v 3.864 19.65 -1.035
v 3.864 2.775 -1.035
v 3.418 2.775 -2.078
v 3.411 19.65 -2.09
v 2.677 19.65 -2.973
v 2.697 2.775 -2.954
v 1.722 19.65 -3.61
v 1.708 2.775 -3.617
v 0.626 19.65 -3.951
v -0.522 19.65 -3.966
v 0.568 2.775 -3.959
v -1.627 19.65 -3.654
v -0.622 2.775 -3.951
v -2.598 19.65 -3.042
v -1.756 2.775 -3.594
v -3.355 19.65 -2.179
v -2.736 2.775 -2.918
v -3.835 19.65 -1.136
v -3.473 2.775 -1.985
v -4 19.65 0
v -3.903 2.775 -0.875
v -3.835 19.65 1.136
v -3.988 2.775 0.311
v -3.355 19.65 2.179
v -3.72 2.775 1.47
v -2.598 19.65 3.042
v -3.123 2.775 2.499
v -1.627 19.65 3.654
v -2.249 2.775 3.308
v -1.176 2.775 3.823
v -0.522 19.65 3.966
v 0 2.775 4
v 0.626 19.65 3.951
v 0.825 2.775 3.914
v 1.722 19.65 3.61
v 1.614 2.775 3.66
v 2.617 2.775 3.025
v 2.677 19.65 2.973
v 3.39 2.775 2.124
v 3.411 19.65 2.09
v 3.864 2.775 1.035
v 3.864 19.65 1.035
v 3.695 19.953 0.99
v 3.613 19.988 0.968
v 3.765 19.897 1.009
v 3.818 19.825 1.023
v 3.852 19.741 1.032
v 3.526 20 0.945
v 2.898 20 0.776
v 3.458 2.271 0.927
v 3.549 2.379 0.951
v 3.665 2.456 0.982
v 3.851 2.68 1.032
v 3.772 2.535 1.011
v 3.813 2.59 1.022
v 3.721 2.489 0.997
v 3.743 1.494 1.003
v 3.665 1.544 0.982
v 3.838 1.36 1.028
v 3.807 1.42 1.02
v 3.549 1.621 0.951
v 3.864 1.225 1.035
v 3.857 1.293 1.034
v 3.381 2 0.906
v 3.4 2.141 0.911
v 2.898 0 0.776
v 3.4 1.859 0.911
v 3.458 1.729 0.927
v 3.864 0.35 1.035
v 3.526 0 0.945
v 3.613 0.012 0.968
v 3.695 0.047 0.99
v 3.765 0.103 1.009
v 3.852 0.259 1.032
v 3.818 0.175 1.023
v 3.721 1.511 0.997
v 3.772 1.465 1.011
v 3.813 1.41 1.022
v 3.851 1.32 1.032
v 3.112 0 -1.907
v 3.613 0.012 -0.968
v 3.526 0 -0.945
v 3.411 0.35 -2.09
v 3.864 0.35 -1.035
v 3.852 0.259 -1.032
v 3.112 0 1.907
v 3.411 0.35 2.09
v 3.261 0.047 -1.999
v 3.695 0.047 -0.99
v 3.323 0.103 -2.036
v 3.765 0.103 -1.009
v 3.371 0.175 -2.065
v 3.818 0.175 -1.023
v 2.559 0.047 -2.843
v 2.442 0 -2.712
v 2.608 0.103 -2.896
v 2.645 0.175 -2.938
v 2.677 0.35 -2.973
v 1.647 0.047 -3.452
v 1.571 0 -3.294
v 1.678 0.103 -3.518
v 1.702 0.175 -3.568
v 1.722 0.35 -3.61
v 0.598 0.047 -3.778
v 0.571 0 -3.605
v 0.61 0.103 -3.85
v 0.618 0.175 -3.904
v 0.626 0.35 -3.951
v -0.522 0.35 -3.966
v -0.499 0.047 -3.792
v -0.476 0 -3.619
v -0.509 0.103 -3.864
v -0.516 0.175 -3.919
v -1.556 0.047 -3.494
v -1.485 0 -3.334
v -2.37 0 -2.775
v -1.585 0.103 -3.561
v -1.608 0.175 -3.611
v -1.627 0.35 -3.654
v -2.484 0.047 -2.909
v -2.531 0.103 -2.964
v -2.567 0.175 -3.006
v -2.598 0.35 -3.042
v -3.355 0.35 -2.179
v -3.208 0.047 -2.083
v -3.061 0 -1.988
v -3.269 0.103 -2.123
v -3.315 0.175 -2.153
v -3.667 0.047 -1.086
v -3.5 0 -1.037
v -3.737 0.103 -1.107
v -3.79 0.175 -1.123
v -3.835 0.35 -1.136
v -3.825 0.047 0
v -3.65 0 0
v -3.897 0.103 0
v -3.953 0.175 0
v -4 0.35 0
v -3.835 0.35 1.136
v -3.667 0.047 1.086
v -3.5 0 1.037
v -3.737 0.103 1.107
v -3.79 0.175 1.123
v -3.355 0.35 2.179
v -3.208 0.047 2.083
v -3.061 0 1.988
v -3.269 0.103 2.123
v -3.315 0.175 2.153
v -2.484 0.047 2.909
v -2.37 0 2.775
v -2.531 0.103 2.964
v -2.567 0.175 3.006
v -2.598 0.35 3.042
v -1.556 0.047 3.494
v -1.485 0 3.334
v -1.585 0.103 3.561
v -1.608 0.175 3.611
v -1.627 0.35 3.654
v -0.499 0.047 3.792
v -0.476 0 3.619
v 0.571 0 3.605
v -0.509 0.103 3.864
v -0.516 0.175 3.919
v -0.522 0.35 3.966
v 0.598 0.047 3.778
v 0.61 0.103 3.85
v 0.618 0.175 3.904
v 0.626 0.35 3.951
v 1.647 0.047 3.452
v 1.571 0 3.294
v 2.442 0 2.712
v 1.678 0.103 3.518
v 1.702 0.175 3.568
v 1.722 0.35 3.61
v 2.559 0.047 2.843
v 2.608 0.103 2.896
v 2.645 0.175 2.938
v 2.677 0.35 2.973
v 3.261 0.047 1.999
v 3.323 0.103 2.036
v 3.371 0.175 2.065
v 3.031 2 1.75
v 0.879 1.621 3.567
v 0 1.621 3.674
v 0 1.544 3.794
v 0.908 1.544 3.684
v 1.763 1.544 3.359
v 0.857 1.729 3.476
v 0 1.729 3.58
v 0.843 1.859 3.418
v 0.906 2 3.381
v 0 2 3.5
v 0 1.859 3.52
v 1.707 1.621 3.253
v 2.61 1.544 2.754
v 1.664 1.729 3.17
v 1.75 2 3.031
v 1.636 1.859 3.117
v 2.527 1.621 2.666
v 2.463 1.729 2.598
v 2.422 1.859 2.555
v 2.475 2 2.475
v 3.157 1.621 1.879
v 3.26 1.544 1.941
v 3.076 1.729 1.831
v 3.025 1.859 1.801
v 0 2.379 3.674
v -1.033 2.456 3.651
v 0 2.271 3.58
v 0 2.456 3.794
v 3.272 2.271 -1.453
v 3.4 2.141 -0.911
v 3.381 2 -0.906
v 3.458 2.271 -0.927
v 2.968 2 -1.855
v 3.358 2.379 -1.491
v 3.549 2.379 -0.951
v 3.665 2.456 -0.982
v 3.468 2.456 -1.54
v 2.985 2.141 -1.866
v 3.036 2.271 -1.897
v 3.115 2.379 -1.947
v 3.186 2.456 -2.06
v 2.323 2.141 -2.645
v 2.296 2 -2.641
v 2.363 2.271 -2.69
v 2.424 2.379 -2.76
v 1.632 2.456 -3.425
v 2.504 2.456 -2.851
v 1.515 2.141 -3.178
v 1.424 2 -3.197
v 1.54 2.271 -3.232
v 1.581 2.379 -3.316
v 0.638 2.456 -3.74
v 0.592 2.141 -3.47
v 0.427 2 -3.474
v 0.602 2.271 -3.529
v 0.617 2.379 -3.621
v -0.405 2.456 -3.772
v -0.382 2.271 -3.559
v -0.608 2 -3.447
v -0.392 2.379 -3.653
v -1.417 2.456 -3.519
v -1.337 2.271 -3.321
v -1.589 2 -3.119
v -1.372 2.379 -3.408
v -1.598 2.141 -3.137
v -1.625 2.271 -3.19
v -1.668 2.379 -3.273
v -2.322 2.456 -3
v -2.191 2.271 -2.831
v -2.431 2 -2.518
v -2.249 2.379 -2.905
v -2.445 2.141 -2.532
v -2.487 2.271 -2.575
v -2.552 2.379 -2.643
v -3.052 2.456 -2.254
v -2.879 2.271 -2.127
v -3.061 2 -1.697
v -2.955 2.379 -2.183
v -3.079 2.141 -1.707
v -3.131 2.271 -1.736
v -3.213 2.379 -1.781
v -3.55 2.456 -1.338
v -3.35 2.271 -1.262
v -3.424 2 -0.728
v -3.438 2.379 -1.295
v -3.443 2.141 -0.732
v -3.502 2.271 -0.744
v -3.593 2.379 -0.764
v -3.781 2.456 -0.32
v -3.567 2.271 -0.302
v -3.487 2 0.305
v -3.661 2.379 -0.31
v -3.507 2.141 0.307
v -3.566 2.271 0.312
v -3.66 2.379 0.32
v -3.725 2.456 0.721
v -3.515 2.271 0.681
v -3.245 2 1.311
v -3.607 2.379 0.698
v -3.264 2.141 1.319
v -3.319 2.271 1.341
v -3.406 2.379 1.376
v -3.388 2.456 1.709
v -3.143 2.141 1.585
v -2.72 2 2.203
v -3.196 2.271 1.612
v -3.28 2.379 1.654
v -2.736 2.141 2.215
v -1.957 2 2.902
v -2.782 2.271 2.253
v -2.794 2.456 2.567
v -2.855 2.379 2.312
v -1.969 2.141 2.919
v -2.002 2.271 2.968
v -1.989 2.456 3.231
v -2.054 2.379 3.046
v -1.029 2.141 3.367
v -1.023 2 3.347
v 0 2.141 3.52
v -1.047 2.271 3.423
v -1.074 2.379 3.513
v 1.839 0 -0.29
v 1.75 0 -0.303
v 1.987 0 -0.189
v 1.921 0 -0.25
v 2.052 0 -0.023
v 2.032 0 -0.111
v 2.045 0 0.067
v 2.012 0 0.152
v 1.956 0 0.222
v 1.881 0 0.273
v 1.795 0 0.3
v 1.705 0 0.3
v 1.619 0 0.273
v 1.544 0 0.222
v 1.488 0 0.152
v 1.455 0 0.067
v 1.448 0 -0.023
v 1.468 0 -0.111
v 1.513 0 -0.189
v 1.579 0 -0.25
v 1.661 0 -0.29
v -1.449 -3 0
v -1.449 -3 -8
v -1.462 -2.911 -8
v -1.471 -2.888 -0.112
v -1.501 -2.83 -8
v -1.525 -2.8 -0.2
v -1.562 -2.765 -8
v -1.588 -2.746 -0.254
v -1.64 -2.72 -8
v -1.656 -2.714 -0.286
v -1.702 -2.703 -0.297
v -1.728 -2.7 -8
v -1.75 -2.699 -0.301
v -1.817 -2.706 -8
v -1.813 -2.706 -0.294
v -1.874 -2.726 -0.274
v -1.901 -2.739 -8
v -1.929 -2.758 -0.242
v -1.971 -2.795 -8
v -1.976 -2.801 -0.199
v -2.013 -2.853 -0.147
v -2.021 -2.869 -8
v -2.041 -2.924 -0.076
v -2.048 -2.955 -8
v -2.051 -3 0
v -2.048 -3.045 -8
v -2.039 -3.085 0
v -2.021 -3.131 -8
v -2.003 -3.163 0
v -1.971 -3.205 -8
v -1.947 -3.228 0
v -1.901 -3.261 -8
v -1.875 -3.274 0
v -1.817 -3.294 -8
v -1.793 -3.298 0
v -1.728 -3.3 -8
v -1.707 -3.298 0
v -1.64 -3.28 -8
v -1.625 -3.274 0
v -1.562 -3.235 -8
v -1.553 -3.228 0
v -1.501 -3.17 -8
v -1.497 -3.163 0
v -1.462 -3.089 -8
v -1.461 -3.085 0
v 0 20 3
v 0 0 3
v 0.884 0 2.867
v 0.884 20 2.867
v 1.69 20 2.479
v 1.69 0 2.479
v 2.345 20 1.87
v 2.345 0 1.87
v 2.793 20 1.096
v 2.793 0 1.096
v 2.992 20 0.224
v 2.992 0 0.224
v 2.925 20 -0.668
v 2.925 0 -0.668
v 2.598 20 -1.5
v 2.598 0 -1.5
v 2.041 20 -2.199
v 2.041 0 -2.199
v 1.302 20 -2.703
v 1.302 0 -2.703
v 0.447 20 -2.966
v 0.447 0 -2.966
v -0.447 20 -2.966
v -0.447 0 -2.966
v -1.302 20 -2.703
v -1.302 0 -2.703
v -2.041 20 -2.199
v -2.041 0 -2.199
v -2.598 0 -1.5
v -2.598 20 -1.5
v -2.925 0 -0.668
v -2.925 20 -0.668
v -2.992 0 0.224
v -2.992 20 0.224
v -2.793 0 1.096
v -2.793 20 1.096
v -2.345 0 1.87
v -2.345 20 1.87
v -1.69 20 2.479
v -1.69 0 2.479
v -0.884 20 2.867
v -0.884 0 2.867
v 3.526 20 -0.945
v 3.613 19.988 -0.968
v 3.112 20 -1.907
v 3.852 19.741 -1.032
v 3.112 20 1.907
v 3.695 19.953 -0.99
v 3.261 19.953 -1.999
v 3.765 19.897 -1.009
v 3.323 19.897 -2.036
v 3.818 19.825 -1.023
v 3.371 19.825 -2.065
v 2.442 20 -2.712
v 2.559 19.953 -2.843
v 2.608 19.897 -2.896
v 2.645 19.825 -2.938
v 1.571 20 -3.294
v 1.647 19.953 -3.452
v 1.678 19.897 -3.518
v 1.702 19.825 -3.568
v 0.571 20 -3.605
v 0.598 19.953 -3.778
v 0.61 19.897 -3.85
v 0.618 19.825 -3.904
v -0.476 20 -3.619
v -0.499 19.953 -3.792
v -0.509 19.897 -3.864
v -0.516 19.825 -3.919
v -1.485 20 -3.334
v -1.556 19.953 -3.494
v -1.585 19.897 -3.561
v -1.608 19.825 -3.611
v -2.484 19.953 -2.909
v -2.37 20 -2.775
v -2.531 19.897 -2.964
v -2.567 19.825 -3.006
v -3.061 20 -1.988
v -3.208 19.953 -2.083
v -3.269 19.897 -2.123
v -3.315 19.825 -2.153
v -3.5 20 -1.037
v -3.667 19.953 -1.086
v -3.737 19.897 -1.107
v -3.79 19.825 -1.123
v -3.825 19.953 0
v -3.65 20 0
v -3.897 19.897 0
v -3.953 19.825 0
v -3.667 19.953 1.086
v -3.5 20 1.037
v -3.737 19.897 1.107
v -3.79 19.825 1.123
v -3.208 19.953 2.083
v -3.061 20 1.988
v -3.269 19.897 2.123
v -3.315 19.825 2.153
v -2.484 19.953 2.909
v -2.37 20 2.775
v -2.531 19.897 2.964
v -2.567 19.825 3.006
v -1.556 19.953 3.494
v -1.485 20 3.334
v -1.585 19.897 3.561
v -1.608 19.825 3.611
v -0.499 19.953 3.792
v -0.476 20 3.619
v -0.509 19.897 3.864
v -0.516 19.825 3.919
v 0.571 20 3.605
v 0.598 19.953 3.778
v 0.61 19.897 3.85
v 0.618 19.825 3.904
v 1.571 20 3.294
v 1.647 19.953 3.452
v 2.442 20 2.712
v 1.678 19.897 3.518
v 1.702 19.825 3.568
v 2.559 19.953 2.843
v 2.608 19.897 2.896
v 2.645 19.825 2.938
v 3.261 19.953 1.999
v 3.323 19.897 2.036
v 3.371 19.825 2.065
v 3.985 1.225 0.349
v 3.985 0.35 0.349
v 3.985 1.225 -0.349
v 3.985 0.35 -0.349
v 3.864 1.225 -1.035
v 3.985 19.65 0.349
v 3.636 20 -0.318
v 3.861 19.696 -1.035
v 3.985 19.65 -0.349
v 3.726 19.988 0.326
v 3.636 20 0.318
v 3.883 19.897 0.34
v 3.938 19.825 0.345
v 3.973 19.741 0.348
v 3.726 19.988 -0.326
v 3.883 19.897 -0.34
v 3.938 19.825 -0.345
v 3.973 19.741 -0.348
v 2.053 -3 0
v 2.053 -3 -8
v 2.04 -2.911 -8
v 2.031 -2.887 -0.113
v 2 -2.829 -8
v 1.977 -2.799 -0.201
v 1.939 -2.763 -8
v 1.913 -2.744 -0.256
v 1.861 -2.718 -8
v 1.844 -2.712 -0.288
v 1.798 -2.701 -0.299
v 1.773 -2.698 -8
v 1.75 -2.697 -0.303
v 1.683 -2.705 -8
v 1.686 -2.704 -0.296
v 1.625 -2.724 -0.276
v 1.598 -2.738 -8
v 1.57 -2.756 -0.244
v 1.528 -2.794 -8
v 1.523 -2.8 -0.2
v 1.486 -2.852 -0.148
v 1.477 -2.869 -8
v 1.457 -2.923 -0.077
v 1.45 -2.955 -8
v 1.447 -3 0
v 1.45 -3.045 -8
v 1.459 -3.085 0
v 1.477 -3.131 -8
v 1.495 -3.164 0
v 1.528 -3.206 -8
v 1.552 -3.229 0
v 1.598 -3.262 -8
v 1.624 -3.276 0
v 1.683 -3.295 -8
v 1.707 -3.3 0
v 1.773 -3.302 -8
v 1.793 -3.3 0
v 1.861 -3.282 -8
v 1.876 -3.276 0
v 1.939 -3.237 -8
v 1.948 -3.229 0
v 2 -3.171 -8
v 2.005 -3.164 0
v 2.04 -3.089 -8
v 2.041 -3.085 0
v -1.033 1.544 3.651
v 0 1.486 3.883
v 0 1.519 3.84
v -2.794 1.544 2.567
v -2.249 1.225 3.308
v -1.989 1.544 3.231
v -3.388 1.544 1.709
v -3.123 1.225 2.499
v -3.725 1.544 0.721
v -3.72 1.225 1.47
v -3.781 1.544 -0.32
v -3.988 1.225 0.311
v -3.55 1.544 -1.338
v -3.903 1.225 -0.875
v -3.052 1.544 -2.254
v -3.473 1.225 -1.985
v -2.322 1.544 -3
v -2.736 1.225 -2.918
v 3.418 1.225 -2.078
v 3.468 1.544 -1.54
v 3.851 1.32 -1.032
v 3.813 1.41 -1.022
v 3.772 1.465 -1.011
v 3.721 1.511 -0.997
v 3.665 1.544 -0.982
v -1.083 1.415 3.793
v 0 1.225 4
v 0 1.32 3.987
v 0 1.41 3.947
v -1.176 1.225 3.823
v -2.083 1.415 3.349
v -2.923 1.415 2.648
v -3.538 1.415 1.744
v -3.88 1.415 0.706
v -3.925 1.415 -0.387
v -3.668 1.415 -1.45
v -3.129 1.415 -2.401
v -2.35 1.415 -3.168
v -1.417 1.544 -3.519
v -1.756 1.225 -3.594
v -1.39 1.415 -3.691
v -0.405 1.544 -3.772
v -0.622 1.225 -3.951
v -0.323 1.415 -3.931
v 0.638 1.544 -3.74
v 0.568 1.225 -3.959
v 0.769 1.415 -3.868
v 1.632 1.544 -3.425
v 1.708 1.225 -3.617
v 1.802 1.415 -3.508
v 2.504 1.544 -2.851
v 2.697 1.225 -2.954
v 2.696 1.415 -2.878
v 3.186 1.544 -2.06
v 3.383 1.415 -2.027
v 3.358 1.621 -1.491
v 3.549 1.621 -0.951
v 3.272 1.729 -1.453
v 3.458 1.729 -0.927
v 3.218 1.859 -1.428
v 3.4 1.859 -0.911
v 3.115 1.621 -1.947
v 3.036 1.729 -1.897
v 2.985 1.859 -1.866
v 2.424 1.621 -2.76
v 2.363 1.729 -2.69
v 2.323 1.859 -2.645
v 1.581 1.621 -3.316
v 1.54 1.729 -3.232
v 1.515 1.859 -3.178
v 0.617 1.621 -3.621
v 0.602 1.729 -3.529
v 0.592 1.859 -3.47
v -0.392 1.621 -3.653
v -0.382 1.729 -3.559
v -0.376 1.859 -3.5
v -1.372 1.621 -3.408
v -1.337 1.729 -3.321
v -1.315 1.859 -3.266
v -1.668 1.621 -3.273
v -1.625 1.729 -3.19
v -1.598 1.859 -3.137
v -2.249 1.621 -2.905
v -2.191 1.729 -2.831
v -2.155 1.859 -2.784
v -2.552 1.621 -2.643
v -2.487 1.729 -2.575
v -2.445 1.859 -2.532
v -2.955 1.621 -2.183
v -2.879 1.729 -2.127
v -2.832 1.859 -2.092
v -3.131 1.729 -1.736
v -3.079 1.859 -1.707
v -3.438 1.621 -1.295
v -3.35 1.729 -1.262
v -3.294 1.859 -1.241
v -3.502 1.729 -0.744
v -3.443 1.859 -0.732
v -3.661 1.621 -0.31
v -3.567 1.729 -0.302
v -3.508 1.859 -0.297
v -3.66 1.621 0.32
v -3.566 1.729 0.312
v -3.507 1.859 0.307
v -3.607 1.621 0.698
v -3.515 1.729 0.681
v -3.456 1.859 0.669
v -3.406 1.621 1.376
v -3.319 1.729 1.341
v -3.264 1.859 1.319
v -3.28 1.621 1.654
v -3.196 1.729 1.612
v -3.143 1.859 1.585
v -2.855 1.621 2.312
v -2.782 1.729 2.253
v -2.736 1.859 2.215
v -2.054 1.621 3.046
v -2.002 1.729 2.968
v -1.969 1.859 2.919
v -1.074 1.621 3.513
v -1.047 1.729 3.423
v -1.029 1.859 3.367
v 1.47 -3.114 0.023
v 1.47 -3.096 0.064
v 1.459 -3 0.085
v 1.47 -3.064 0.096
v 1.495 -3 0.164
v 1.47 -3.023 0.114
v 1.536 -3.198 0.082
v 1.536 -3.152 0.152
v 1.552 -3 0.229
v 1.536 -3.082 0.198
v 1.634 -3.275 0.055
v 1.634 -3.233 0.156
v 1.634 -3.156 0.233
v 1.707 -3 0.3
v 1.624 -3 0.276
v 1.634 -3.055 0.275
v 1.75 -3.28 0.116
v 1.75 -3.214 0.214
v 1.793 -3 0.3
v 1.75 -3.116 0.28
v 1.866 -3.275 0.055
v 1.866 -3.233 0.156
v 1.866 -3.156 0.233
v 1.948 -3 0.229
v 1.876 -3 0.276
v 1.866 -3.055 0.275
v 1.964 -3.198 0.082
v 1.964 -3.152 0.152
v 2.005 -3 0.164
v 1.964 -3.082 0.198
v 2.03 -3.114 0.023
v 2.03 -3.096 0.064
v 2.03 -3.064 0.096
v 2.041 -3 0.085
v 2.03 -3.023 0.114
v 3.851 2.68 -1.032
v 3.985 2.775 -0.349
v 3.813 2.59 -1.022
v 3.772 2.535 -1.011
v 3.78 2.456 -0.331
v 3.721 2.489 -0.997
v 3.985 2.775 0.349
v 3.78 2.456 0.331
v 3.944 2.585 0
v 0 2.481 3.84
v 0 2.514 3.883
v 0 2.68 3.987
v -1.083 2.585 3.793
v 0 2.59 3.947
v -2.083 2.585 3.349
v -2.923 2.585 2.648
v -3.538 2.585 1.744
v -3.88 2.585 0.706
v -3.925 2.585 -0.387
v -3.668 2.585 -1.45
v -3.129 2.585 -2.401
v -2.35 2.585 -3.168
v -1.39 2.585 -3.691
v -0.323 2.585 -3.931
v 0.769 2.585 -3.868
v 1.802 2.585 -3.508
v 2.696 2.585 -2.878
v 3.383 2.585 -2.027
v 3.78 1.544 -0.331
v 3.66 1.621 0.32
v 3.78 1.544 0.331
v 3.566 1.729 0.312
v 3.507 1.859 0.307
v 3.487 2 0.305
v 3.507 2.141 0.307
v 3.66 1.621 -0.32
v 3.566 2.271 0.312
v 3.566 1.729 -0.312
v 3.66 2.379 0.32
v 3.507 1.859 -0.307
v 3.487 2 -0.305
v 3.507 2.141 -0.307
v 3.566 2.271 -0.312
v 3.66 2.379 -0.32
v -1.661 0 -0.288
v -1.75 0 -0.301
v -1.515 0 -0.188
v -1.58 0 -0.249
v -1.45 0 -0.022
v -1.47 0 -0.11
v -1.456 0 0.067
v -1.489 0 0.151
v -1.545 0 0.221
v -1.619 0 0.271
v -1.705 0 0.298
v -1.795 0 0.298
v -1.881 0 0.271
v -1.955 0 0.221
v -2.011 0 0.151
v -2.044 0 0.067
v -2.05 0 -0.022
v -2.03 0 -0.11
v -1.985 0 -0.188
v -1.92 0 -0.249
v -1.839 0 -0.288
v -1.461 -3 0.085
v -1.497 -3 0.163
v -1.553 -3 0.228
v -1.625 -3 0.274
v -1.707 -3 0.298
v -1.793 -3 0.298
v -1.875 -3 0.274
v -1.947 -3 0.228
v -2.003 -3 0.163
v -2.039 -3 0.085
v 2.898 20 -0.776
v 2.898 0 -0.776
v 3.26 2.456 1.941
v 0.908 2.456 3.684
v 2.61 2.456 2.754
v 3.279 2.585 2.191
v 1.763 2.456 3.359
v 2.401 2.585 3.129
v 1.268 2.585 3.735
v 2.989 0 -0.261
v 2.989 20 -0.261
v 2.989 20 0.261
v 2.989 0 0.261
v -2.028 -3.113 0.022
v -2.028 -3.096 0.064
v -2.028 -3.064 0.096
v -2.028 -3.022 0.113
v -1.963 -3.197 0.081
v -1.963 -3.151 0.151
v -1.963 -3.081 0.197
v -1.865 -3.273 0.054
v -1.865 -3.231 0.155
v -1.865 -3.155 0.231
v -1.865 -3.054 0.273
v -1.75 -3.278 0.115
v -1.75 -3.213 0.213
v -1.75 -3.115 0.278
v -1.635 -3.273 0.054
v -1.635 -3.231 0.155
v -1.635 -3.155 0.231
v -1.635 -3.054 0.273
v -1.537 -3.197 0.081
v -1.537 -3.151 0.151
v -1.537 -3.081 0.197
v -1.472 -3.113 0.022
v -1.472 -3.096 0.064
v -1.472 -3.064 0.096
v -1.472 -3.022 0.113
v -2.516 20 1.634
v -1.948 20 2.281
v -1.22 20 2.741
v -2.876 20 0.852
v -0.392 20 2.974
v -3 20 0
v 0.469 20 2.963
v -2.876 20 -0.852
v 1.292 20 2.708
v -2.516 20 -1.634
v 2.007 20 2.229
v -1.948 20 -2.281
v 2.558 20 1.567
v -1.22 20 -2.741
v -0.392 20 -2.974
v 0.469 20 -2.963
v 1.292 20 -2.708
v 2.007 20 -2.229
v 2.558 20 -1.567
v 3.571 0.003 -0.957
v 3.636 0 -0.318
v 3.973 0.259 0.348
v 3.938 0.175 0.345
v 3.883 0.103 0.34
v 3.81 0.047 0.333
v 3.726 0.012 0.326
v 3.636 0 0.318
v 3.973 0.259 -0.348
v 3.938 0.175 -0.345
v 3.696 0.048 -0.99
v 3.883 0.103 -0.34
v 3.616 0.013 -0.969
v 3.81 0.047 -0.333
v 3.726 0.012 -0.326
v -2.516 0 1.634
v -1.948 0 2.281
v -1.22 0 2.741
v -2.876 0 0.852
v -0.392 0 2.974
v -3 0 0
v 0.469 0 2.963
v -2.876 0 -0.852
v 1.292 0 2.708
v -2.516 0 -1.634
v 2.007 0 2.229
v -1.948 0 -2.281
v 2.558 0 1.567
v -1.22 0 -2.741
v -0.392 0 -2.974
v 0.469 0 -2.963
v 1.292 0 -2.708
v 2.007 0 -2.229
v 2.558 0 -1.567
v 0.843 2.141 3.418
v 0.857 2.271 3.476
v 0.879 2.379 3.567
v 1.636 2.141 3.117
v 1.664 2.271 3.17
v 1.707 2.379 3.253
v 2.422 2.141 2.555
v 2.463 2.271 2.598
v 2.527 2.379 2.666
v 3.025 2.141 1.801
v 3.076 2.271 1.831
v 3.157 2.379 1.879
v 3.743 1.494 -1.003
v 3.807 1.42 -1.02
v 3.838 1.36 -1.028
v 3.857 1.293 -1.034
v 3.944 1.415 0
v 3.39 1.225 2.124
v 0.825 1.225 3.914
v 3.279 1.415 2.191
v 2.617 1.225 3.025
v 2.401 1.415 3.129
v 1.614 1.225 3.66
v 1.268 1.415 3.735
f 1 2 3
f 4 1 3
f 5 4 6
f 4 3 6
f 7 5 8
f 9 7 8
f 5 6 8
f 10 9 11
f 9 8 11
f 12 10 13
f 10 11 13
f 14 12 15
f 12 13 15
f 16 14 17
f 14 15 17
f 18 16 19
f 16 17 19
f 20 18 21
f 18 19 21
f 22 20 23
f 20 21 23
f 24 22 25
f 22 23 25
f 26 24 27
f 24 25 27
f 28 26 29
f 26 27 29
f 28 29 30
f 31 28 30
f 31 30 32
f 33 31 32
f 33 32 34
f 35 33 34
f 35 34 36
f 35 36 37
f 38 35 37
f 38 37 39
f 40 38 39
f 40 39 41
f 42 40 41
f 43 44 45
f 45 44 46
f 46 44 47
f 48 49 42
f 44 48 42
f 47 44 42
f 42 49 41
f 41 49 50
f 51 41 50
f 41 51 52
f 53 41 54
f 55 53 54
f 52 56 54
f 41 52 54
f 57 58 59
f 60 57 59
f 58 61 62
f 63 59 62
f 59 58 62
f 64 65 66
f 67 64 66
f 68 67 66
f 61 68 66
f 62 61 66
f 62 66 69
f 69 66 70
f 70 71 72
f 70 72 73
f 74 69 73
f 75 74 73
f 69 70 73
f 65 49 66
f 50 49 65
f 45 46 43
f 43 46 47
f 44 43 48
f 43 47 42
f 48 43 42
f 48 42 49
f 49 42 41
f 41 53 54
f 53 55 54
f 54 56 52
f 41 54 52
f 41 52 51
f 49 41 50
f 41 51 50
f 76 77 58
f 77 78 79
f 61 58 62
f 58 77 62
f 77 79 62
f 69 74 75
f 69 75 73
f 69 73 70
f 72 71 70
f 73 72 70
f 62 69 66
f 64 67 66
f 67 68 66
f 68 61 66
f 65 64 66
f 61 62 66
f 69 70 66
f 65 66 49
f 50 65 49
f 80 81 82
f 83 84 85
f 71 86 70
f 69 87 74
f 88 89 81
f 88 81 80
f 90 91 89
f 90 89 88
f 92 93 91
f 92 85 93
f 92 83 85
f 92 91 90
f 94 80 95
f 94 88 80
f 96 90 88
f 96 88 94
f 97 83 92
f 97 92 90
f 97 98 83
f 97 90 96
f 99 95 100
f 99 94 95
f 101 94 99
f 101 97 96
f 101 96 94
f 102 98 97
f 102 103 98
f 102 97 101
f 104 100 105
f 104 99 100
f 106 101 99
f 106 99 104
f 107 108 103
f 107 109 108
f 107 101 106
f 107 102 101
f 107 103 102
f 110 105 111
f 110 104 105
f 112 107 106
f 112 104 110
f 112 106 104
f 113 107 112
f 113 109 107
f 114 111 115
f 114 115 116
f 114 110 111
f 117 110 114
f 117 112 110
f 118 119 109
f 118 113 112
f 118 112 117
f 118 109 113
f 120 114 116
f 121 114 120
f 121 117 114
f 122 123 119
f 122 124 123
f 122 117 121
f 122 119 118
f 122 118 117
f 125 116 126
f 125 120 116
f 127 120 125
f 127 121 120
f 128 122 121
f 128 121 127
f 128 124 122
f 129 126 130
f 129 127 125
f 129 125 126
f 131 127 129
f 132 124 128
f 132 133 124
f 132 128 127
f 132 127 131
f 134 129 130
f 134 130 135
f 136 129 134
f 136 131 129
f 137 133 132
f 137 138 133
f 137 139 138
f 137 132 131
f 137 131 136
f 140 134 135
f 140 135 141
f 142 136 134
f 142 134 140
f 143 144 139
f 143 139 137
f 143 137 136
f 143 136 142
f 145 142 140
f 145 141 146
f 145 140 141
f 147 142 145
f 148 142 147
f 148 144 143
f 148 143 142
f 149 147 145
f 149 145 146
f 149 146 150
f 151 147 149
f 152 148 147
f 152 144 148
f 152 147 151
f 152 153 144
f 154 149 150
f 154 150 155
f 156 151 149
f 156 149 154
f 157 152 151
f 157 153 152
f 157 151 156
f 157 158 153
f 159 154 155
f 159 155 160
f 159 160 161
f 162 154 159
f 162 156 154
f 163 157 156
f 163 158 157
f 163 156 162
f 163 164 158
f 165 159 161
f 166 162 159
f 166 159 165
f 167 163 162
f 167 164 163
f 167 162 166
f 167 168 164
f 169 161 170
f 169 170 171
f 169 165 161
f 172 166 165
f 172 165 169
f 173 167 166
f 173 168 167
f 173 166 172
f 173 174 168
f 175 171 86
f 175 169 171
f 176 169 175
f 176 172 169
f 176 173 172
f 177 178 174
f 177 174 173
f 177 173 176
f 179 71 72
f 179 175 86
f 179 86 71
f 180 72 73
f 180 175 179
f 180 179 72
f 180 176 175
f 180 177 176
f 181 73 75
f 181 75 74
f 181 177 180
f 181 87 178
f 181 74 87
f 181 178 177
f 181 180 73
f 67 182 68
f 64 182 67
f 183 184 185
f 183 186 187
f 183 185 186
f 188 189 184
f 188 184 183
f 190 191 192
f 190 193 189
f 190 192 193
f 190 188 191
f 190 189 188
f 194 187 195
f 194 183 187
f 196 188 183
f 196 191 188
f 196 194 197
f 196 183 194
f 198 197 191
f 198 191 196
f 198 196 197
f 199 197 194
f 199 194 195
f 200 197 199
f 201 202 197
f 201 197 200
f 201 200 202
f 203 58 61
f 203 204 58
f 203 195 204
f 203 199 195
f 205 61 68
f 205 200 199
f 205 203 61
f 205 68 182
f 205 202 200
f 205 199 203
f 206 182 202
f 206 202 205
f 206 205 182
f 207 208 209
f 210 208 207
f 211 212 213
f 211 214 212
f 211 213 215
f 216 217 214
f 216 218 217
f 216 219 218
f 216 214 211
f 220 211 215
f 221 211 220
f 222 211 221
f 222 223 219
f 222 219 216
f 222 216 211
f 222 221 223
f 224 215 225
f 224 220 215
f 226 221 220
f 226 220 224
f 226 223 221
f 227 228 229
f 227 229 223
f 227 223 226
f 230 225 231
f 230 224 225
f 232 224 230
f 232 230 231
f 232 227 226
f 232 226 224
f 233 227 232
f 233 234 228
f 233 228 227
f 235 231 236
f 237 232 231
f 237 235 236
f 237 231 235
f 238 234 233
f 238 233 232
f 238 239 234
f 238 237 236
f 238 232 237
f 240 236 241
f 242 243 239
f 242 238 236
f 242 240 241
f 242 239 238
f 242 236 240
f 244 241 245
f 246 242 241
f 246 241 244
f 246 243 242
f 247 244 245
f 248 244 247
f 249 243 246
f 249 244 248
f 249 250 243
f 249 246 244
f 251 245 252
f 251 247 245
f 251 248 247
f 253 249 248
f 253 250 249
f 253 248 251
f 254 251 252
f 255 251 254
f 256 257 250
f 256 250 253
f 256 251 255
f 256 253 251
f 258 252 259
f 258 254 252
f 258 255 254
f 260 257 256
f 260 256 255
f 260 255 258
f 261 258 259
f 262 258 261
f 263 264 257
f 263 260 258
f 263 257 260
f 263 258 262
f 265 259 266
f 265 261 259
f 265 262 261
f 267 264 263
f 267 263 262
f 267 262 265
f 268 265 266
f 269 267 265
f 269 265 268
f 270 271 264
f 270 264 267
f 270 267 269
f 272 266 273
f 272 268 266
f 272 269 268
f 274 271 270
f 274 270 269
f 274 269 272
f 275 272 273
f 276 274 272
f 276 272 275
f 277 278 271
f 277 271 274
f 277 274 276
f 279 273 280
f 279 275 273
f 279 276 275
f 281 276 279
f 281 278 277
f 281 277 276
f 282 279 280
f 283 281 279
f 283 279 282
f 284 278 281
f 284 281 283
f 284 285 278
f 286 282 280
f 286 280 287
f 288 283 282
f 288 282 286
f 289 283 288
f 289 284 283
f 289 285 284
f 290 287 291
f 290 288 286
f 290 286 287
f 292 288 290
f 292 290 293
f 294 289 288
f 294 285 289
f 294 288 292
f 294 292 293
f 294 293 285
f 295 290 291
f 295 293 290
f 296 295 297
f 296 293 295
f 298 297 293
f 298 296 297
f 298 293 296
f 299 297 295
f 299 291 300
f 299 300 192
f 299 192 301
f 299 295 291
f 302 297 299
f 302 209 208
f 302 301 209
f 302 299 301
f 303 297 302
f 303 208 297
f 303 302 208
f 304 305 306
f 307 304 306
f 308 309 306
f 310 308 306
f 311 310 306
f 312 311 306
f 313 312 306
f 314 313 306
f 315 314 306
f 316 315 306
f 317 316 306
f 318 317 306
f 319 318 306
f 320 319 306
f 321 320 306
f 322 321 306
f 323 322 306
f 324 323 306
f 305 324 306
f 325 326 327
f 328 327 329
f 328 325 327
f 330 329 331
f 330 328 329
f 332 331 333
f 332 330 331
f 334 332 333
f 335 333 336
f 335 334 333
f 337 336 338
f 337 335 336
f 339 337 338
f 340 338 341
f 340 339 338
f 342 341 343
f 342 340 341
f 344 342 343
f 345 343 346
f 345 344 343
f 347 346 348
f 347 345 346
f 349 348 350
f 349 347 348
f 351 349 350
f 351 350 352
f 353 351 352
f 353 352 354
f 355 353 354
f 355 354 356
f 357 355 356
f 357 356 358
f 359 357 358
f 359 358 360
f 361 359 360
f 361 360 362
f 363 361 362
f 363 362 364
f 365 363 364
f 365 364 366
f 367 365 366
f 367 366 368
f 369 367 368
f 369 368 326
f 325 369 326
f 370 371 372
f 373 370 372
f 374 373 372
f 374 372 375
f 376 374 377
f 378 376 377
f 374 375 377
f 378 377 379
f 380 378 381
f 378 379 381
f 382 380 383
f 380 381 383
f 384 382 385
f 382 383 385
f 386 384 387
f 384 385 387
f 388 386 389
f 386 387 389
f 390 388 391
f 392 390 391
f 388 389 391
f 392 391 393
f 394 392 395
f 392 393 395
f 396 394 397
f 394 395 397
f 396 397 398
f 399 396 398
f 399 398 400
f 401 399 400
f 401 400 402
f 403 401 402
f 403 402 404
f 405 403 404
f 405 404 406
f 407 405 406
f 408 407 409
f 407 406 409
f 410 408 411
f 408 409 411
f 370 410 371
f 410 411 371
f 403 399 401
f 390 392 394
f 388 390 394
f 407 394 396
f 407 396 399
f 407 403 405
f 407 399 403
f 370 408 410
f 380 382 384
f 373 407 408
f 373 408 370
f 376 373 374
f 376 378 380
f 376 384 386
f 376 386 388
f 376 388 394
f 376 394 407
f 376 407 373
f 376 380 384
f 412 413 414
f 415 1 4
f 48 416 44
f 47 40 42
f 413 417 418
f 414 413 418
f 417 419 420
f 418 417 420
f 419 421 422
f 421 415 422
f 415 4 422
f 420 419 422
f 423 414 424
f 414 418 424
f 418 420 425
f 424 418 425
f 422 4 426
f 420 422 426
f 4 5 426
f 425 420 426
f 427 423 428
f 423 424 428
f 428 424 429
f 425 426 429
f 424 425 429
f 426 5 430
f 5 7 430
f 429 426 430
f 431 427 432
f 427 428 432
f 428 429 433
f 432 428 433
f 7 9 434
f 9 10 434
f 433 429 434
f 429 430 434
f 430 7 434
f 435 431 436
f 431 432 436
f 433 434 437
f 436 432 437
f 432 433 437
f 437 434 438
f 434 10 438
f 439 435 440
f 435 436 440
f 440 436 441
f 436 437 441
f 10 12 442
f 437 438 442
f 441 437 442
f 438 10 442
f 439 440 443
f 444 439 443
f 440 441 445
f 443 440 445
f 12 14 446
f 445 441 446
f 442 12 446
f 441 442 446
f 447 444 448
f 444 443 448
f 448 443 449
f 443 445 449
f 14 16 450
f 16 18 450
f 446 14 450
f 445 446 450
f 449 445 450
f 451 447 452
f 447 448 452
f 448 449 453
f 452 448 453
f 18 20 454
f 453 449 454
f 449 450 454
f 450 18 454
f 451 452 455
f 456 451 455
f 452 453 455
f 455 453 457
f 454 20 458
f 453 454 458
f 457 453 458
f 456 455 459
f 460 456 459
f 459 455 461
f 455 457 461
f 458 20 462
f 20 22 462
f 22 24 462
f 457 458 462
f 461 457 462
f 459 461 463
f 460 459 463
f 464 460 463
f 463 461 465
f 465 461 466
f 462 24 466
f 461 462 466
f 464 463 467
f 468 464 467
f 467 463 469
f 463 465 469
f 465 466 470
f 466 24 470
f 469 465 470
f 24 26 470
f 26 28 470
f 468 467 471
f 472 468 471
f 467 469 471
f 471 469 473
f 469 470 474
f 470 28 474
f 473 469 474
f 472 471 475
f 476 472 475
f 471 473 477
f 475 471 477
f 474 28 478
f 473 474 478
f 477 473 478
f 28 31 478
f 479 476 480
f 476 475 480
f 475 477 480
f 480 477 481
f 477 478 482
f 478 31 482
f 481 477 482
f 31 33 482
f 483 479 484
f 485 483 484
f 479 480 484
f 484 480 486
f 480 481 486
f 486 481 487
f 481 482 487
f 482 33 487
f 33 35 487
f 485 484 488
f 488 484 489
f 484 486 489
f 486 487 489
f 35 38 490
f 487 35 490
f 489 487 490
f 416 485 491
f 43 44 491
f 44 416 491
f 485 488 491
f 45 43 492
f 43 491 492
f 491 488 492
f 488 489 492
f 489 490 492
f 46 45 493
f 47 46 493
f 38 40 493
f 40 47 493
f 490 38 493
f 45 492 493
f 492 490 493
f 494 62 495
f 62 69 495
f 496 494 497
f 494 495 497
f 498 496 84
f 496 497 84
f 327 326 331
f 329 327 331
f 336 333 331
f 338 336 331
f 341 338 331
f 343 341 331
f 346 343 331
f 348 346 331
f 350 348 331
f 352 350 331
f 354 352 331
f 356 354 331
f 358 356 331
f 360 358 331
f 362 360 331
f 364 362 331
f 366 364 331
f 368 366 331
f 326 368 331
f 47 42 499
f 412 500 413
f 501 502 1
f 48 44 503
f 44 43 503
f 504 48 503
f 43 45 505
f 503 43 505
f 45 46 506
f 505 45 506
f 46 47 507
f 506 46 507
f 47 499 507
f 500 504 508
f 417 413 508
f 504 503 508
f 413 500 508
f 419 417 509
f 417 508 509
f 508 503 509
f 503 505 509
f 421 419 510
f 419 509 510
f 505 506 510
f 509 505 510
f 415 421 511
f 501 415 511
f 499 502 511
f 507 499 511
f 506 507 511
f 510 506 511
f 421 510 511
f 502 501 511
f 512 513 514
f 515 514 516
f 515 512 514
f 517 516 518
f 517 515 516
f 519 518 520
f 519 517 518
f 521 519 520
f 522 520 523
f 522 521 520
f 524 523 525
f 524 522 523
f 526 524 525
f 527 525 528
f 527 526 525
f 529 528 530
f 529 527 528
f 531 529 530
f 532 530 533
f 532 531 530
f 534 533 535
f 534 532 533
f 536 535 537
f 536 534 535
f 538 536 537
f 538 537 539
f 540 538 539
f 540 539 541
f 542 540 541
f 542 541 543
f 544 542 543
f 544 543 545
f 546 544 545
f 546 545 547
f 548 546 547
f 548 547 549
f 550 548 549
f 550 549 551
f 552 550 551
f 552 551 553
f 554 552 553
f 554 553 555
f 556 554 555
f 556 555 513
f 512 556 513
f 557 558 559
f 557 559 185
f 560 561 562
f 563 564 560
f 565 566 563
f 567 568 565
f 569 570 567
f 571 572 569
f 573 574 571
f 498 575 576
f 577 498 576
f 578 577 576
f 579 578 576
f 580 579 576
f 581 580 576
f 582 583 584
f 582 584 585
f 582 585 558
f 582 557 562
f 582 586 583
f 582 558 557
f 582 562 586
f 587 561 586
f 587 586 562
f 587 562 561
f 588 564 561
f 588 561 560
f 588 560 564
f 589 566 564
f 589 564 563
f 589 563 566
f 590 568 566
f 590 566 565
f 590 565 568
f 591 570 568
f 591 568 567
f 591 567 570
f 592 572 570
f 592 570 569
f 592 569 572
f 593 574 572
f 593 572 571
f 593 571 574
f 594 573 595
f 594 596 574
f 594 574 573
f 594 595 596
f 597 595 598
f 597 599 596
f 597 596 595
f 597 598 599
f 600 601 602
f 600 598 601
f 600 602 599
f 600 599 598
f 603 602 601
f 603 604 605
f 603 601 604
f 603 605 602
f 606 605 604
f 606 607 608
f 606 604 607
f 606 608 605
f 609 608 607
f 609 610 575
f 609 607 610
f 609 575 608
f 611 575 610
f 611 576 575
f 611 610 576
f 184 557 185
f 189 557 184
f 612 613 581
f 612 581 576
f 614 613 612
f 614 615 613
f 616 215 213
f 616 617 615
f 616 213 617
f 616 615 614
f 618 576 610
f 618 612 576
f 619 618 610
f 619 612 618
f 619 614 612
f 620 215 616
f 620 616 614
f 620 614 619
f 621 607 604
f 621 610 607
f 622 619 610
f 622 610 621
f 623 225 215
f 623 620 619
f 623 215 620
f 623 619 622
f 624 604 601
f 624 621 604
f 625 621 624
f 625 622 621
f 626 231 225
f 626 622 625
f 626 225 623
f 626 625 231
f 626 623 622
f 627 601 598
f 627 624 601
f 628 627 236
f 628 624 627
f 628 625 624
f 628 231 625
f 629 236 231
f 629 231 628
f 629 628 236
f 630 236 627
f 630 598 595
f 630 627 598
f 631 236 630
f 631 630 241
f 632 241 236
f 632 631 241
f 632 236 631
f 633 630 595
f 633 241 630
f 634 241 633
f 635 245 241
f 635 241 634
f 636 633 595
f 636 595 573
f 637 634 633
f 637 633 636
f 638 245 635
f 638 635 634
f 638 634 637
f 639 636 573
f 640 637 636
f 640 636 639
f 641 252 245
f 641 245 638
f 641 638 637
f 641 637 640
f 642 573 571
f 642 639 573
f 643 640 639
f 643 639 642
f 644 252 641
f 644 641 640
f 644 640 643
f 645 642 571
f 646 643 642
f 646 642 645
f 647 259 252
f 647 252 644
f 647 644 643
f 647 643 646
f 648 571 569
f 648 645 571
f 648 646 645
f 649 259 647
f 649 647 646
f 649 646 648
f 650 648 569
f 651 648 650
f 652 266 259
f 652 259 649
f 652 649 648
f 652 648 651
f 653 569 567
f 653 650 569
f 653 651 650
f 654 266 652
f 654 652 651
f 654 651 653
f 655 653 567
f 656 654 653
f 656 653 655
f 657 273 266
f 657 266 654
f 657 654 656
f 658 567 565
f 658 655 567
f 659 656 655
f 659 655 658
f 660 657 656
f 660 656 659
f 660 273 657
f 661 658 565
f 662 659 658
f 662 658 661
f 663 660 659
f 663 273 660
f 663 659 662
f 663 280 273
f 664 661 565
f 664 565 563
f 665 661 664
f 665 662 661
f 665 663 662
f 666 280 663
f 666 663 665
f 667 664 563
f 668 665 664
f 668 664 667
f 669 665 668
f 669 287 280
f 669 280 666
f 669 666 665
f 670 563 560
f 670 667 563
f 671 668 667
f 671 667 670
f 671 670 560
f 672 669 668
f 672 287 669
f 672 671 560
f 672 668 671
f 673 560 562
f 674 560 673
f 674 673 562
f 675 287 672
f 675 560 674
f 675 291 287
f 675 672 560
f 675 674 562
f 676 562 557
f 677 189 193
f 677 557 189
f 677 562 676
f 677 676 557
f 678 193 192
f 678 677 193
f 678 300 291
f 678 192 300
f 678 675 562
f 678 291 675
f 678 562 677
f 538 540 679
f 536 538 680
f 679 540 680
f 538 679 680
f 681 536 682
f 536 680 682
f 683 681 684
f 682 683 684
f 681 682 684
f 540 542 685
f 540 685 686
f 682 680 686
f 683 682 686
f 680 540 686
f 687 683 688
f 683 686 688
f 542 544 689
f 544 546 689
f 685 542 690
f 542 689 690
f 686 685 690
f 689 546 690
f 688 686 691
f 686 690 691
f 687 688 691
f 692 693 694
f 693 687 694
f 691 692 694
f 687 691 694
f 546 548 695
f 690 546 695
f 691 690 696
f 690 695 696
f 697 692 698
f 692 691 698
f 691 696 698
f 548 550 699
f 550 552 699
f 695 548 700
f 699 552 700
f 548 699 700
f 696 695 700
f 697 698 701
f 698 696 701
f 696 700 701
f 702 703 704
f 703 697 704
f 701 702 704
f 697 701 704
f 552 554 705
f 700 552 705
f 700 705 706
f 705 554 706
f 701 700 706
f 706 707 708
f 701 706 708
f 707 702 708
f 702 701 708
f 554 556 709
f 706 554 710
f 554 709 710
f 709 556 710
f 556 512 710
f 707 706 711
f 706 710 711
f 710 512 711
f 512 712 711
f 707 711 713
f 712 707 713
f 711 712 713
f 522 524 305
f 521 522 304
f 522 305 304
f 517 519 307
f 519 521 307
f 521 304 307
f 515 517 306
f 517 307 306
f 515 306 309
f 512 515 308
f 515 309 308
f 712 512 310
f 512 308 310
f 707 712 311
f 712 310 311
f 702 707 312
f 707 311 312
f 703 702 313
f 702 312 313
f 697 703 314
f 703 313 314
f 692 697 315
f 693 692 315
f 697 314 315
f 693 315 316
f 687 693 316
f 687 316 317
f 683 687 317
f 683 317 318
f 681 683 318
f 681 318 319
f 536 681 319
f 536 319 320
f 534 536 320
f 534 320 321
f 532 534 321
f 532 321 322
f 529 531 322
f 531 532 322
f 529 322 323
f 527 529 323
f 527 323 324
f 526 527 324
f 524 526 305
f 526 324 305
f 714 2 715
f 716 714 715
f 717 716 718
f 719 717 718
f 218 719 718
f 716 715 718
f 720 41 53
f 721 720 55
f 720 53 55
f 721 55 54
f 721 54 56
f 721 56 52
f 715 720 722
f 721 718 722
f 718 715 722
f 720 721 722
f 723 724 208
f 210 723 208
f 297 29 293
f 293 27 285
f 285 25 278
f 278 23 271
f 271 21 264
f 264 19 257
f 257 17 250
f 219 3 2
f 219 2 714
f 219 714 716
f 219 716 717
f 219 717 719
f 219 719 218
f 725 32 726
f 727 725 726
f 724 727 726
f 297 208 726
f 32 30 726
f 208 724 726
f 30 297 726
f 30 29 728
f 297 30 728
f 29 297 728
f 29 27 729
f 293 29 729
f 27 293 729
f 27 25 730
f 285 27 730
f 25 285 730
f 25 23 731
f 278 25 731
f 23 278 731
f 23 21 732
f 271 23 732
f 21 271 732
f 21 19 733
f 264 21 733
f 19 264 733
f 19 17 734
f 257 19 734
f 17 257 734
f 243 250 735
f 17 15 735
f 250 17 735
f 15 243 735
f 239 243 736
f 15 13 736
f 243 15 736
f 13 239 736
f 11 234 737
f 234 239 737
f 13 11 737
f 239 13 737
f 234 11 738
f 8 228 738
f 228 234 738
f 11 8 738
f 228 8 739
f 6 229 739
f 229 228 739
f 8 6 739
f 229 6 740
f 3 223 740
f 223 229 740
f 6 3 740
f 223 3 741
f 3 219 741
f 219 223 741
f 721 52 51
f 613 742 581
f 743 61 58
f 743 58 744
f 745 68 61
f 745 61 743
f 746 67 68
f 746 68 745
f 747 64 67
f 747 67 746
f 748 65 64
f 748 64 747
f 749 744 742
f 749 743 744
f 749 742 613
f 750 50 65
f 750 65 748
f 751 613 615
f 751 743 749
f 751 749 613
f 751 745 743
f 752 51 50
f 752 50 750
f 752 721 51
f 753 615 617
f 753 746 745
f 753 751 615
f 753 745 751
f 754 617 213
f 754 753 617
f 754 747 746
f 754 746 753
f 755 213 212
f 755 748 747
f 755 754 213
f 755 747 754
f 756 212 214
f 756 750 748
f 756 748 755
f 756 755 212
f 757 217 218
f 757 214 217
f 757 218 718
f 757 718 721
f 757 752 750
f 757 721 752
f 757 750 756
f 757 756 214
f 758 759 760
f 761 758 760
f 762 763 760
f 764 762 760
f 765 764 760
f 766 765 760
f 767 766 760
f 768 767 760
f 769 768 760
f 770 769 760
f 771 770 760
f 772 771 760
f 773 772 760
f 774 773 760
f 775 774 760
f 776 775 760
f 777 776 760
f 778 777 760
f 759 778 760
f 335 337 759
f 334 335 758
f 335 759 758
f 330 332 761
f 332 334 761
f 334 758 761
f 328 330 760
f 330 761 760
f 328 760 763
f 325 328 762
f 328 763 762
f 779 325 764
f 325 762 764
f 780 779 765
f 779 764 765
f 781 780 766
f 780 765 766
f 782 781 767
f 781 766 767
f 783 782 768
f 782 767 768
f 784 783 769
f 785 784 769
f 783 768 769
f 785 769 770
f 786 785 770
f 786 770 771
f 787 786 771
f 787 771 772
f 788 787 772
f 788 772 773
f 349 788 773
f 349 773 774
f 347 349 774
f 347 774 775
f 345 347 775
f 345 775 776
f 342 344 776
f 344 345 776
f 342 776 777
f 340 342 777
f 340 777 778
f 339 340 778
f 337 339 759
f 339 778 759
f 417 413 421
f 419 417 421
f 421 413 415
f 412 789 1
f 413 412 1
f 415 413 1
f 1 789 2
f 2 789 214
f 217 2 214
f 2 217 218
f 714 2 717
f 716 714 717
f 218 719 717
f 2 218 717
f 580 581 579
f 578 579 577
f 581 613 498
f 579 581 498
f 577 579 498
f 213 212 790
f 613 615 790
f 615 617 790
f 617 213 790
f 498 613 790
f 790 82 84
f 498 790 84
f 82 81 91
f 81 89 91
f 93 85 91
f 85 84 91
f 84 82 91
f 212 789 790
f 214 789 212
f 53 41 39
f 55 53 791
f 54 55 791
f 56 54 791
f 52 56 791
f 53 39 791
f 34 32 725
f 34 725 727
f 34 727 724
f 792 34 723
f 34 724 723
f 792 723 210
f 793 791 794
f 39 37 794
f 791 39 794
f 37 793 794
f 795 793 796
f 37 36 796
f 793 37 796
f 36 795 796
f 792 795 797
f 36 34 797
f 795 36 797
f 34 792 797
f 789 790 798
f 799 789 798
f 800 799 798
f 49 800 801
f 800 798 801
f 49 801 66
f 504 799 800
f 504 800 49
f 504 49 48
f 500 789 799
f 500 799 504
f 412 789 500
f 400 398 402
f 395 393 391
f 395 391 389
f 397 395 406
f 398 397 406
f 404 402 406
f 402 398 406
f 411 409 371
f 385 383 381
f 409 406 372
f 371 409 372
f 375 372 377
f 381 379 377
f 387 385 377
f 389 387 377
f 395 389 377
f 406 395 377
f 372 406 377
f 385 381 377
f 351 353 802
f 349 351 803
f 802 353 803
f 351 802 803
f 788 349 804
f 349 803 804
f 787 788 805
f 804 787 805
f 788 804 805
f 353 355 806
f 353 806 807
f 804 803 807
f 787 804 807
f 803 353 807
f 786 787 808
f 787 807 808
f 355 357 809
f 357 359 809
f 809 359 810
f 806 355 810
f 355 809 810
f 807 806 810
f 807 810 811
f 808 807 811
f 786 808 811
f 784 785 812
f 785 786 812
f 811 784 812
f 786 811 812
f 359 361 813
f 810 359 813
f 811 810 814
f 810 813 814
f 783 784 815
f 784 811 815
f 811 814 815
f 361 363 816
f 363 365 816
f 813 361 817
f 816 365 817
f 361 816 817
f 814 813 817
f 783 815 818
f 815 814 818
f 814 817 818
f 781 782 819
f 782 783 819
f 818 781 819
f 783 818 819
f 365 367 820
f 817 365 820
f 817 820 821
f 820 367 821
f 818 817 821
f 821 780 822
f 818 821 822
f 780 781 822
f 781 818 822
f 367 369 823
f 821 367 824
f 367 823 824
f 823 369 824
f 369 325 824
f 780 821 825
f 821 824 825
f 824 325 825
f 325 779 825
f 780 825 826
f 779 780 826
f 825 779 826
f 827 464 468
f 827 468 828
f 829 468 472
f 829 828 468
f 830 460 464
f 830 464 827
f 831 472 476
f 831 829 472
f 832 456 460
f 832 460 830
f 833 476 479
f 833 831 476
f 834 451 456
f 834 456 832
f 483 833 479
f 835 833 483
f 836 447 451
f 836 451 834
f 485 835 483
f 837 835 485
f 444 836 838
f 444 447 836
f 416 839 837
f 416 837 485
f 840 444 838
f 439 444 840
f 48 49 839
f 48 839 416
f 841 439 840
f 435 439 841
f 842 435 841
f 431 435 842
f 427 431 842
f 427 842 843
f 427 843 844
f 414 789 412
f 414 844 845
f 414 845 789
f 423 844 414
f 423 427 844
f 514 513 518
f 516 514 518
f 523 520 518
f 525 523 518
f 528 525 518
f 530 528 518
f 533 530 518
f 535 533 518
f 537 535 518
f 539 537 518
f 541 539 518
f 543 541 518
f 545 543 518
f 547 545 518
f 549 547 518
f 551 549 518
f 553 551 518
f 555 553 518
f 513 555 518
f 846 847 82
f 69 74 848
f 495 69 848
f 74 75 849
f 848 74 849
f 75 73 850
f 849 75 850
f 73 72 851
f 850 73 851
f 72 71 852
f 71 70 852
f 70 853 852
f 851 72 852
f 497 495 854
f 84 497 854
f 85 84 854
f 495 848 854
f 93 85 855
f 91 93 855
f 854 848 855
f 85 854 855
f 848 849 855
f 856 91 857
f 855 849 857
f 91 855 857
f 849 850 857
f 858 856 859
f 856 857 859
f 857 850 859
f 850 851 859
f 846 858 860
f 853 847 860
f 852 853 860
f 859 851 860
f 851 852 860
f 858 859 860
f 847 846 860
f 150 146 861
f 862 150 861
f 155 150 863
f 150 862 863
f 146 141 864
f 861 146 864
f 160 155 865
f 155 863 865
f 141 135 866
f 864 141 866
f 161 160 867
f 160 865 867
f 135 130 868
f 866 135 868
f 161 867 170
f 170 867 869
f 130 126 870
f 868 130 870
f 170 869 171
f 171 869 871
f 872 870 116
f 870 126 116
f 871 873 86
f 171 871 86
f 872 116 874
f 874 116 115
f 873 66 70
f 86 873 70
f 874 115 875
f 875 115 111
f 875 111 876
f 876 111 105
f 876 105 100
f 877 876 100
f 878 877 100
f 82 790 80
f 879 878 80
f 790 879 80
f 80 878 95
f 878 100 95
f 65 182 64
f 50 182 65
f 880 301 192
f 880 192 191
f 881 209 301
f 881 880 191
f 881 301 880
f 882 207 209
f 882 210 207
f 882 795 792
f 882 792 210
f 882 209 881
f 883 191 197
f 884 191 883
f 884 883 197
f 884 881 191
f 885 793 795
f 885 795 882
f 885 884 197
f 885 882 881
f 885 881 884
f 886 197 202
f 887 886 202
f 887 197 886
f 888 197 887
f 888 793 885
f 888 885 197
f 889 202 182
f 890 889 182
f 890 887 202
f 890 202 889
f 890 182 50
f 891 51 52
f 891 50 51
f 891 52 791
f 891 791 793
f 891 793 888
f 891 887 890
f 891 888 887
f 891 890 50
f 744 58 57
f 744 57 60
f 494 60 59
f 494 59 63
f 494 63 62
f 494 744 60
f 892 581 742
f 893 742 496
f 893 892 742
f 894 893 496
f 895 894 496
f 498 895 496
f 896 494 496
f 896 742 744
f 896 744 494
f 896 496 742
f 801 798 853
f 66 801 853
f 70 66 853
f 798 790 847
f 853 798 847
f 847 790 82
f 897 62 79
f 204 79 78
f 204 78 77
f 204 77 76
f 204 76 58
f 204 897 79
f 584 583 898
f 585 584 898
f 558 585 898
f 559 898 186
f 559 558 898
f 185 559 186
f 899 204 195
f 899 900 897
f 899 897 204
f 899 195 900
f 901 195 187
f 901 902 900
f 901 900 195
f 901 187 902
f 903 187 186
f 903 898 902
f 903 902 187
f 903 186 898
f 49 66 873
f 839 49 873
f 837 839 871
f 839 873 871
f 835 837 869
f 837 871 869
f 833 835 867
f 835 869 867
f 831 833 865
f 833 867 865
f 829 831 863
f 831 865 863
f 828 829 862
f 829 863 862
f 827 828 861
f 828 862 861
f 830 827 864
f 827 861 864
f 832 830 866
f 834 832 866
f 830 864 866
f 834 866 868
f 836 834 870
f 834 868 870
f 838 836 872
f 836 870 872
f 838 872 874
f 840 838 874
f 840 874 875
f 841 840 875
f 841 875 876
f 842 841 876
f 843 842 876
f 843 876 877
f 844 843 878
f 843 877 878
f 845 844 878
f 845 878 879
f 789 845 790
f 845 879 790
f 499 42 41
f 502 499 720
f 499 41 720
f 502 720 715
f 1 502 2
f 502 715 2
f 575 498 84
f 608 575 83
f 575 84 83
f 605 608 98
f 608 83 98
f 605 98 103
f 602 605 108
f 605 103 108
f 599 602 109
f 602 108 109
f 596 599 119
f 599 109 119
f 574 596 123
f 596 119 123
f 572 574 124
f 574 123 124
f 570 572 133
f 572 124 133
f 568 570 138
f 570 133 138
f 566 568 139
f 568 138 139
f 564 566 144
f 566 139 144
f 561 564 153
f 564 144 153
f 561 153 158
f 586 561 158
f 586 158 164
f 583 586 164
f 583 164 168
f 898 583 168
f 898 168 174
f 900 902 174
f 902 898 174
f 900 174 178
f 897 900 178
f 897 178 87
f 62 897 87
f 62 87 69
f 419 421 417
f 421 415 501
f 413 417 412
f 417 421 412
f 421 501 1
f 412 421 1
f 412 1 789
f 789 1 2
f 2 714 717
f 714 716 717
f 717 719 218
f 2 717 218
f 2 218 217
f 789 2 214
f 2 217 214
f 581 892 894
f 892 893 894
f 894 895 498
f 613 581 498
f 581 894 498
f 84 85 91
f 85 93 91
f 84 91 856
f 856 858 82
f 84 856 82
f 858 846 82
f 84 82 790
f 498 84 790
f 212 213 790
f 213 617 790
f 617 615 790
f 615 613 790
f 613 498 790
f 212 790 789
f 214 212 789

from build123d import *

# Parameters (mm, degrees)
SALIENTE_EXTRUIR3_DEPTH   = 20
SALIENTE_EXTRUIR4_DEPTH   = 20
SALIENTE_EXTRUIR5_DEPTH   = 20
CROQUIS3_R                = 0.4999999999999999
REDONDEO1_R               = 0.35
REDONDEO2_R               = 0.35
CROQUIS4_R                = 0.30107653954551516
SALIENTE_EXTRUIR6_DEPTH   = 3
CROQUIS4_R_2              = 0.30302467240714076
SALIENTE_EXTRUIR6_2_DEPTH = 3
CROQUIS5_R                = 0.30107653954551516
CROQUIS5_R_2              = 0.30302467240714076
SALIENTE_EXTRUIR7_DEPTH   = 8


with BuildPart() as part:
    # Croquis1 → Saliente-Extruir3 (new body)
    with BuildSketch(Plane(origin=(0, 0, 0), x_dir=(1, 0, 0), z_dir=(0, 1, 0))):
        with BuildLine():
            Line((3.8637033051562724, 1.0352761804100858), (2.8977774788672046, 0.7764571353075645))
            ThreePointArc((2.897777478867204, 0.7764571353075644), (2.974334584121431, 0.3915785766601559), (3, 0))
            ThreePointArc((3, -7.3e-16), (2.974334584121431, -0.3915785766601577), (2.897777478867204, -0.7764571353075647))
            Line((2.8977774788672046, -0.7764571353075641), (3.8637033051562724, -1.0352761804100854))
            ThreePointArc((3.8637033051562724, -1.0352761804100863), (3.965779445495241, -0.5221047688802103), (4, -9.8e-16))
            ThreePointArc((4, 0), (3.9657794454952415, 0.5221047688802078), (3.8637033051562724, 1.0352761804100858))
        make_face()
    extrude(amount=SALIENTE_EXTRUIR3_DEPTH)


with BuildPart() as body_2:
    # Croquis1<5> → Saliente-Extruir4 (new body)
    with BuildSketch(Plane(origin=(0, 0, 0), x_dir=(1, 0, 0), z_dir=(0, 1, 0))):
        with BuildLine():
            ThreePointArc((3, 0), (2.974334584121431, 0.3915785766601559), (2.897777478867204, 0.7764571353075644))
            ThreePointArc((2.897777478867204, 0.7764571353075644), (-3, -9.6e-16), (2.897777478867205, -0.776457135307562))
            ThreePointArc((2.897777478867204, -0.7764571353075647), (2.974334584121431, -0.3915785766601577), (3, -7.3e-16))
        make_face()
    extrude(amount=SALIENTE_EXTRUIR4_DEPTH)


with BuildPart() as body_3:
    # Croquis1<6> → Saliente-Extruir5 (new body)
    with BuildSketch(Plane(origin=(0, 0, 0), x_dir=(1, 0, 0), z_dir=(0, 1, 0))):
        with BuildLine():
            ThreePointArc((2.897777478867205, -0.776457135307562), (-3, -9.6e-16), (2.897777478867204, 0.7764571353075644))
            Line((2.8977774788672046, 0.7764571353075645), (3.8637033051562724, 1.0352761804100858))
            ThreePointArc((3.8637033051562724, 1.0352761804100858), (-4, 4.9e-16), (3.8637033051562724, -1.0352761804100863))
            Line((3.8637033051562724, -1.0352761804100854), (2.8977774788672046, -0.7764571353075641))
        make_face()
    extrude(amount=SALIENTE_EXTRUIR5_DEPTH)


with BuildPart() as cortar_revoluci_n1_tool:
    # Croquis3 → Cortar-Revolución1 (revolve)
    with BuildSketch(Plane(origin=(0, 0, 0), x_dir=(0, 0, -1), z_dir=(1, 0, 0))):
        with Locations((-4, 1.9999999999999982)):
            Circle(CROQUIS3_R)
    revolve(axis=Axis((0, -1.7359986127882774, 0), (0, 1, 0)))


with BuildPart() as part_1:
    add(part.part)

    # Cortar-Revolución1: cut by cortar_revoluci_n1_tool
    add(cortar_revoluci_n1_tool.part, mode=Mode.SUBTRACT)

    # Redondeo2
    redondeo2_edges = [part_1.edges().sort_by_distance(p)[0] for p in [
        (4, 0, -4.7e-16),
        (3.999999999997482, 1.4999999999999982, -7.0699e-12),
        (3.999999999997482, 2.4999999999999982, 7.09233e-12),
        (4.000000000000001, 20, 6.7e-16),
    ]]
    fillet(redondeo2_edges, radius=REDONDEO2_R)


with BuildPart() as body_3_1:
    add(body_3.part)

    # Cortar-Revolución1: cut by cortar_revoluci_n1_tool
    add(cortar_revoluci_n1_tool.part, mode=Mode.SUBTRACT)

    # Redondeo1
    redondeo1_edges = [body_3_1.edges().sort_by_distance(p)[0] for p in [
        (-4, 0, 6.55e-15),
        (-3.1734133611649407, 1.4999999999999982, -2.435045716034882),
        (-3.1734133611649407, 2.4999999999999982, -2.435045716034882),
        (-4, 20, 6.55e-15),
    ]]
    fillet(redondeo1_edges, radius=REDONDEO1_R)


with BuildPart() as body_4:
    # Croquis4 → Saliente-Extruir6 (new body)
    with BuildSketch(Plane.XZ):
        with Locations((-1.75, 0)):
            Circle(CROQUIS4_R)
    extrude(amount=SALIENTE_EXTRUIR6_DEPTH)



with BuildPart() as body_5:
    # Croquis4 → Saliente-Extruir6 2 (new body)
    with BuildSketch(Plane.XZ):
        with Locations((1.75, 0)):
            Circle(CROQUIS4_R_2)
    extrude(amount=SALIENTE_EXTRUIR6_2_DEPTH)


with BuildPart() as body_4_1:
    add(body_4.part)

    add(body_5.part)  # Saliente-Extruir7 merges body 5
    # Croquis5 → Saliente-Extruir7 (add)
    with BuildSketch(Plane.XY):
        with Locations((-1.75, -3)):
            Circle(CROQUIS5_R)
        with Locations((1.75, -3)):
            Circle(CROQUIS5_R_2)
    extrude(amount=-SALIENTE_EXTRUIR7_DEPTH)

    # Croquis6 → Revolución1 (revolve)
    with BuildSketch(Plane.XY):
        with BuildLine():
            Line((-1.448923460454485, -3), (-2.051076539545515, -3))
            ThreePointArc((-2.051076539545515, -3), (-1.75, -3.301076539545515), (-1.448923460454485, -3))
        make_face()
        with BuildLine():
            Line((2.053024672407141, -3), (1.4469753275928592, -3))
            ThreePointArc((1.4469753275928592, -3), (1.75, -3.303024672407141), (2.053024672407141, -3))
        make_face()
    revolve(axis=Axis((2.053024672407141, -3, 0), (-1, 0, 0)))


solid = Compound([body_2.part, part_1.part, body_3_1.part, body_4_1.part])
